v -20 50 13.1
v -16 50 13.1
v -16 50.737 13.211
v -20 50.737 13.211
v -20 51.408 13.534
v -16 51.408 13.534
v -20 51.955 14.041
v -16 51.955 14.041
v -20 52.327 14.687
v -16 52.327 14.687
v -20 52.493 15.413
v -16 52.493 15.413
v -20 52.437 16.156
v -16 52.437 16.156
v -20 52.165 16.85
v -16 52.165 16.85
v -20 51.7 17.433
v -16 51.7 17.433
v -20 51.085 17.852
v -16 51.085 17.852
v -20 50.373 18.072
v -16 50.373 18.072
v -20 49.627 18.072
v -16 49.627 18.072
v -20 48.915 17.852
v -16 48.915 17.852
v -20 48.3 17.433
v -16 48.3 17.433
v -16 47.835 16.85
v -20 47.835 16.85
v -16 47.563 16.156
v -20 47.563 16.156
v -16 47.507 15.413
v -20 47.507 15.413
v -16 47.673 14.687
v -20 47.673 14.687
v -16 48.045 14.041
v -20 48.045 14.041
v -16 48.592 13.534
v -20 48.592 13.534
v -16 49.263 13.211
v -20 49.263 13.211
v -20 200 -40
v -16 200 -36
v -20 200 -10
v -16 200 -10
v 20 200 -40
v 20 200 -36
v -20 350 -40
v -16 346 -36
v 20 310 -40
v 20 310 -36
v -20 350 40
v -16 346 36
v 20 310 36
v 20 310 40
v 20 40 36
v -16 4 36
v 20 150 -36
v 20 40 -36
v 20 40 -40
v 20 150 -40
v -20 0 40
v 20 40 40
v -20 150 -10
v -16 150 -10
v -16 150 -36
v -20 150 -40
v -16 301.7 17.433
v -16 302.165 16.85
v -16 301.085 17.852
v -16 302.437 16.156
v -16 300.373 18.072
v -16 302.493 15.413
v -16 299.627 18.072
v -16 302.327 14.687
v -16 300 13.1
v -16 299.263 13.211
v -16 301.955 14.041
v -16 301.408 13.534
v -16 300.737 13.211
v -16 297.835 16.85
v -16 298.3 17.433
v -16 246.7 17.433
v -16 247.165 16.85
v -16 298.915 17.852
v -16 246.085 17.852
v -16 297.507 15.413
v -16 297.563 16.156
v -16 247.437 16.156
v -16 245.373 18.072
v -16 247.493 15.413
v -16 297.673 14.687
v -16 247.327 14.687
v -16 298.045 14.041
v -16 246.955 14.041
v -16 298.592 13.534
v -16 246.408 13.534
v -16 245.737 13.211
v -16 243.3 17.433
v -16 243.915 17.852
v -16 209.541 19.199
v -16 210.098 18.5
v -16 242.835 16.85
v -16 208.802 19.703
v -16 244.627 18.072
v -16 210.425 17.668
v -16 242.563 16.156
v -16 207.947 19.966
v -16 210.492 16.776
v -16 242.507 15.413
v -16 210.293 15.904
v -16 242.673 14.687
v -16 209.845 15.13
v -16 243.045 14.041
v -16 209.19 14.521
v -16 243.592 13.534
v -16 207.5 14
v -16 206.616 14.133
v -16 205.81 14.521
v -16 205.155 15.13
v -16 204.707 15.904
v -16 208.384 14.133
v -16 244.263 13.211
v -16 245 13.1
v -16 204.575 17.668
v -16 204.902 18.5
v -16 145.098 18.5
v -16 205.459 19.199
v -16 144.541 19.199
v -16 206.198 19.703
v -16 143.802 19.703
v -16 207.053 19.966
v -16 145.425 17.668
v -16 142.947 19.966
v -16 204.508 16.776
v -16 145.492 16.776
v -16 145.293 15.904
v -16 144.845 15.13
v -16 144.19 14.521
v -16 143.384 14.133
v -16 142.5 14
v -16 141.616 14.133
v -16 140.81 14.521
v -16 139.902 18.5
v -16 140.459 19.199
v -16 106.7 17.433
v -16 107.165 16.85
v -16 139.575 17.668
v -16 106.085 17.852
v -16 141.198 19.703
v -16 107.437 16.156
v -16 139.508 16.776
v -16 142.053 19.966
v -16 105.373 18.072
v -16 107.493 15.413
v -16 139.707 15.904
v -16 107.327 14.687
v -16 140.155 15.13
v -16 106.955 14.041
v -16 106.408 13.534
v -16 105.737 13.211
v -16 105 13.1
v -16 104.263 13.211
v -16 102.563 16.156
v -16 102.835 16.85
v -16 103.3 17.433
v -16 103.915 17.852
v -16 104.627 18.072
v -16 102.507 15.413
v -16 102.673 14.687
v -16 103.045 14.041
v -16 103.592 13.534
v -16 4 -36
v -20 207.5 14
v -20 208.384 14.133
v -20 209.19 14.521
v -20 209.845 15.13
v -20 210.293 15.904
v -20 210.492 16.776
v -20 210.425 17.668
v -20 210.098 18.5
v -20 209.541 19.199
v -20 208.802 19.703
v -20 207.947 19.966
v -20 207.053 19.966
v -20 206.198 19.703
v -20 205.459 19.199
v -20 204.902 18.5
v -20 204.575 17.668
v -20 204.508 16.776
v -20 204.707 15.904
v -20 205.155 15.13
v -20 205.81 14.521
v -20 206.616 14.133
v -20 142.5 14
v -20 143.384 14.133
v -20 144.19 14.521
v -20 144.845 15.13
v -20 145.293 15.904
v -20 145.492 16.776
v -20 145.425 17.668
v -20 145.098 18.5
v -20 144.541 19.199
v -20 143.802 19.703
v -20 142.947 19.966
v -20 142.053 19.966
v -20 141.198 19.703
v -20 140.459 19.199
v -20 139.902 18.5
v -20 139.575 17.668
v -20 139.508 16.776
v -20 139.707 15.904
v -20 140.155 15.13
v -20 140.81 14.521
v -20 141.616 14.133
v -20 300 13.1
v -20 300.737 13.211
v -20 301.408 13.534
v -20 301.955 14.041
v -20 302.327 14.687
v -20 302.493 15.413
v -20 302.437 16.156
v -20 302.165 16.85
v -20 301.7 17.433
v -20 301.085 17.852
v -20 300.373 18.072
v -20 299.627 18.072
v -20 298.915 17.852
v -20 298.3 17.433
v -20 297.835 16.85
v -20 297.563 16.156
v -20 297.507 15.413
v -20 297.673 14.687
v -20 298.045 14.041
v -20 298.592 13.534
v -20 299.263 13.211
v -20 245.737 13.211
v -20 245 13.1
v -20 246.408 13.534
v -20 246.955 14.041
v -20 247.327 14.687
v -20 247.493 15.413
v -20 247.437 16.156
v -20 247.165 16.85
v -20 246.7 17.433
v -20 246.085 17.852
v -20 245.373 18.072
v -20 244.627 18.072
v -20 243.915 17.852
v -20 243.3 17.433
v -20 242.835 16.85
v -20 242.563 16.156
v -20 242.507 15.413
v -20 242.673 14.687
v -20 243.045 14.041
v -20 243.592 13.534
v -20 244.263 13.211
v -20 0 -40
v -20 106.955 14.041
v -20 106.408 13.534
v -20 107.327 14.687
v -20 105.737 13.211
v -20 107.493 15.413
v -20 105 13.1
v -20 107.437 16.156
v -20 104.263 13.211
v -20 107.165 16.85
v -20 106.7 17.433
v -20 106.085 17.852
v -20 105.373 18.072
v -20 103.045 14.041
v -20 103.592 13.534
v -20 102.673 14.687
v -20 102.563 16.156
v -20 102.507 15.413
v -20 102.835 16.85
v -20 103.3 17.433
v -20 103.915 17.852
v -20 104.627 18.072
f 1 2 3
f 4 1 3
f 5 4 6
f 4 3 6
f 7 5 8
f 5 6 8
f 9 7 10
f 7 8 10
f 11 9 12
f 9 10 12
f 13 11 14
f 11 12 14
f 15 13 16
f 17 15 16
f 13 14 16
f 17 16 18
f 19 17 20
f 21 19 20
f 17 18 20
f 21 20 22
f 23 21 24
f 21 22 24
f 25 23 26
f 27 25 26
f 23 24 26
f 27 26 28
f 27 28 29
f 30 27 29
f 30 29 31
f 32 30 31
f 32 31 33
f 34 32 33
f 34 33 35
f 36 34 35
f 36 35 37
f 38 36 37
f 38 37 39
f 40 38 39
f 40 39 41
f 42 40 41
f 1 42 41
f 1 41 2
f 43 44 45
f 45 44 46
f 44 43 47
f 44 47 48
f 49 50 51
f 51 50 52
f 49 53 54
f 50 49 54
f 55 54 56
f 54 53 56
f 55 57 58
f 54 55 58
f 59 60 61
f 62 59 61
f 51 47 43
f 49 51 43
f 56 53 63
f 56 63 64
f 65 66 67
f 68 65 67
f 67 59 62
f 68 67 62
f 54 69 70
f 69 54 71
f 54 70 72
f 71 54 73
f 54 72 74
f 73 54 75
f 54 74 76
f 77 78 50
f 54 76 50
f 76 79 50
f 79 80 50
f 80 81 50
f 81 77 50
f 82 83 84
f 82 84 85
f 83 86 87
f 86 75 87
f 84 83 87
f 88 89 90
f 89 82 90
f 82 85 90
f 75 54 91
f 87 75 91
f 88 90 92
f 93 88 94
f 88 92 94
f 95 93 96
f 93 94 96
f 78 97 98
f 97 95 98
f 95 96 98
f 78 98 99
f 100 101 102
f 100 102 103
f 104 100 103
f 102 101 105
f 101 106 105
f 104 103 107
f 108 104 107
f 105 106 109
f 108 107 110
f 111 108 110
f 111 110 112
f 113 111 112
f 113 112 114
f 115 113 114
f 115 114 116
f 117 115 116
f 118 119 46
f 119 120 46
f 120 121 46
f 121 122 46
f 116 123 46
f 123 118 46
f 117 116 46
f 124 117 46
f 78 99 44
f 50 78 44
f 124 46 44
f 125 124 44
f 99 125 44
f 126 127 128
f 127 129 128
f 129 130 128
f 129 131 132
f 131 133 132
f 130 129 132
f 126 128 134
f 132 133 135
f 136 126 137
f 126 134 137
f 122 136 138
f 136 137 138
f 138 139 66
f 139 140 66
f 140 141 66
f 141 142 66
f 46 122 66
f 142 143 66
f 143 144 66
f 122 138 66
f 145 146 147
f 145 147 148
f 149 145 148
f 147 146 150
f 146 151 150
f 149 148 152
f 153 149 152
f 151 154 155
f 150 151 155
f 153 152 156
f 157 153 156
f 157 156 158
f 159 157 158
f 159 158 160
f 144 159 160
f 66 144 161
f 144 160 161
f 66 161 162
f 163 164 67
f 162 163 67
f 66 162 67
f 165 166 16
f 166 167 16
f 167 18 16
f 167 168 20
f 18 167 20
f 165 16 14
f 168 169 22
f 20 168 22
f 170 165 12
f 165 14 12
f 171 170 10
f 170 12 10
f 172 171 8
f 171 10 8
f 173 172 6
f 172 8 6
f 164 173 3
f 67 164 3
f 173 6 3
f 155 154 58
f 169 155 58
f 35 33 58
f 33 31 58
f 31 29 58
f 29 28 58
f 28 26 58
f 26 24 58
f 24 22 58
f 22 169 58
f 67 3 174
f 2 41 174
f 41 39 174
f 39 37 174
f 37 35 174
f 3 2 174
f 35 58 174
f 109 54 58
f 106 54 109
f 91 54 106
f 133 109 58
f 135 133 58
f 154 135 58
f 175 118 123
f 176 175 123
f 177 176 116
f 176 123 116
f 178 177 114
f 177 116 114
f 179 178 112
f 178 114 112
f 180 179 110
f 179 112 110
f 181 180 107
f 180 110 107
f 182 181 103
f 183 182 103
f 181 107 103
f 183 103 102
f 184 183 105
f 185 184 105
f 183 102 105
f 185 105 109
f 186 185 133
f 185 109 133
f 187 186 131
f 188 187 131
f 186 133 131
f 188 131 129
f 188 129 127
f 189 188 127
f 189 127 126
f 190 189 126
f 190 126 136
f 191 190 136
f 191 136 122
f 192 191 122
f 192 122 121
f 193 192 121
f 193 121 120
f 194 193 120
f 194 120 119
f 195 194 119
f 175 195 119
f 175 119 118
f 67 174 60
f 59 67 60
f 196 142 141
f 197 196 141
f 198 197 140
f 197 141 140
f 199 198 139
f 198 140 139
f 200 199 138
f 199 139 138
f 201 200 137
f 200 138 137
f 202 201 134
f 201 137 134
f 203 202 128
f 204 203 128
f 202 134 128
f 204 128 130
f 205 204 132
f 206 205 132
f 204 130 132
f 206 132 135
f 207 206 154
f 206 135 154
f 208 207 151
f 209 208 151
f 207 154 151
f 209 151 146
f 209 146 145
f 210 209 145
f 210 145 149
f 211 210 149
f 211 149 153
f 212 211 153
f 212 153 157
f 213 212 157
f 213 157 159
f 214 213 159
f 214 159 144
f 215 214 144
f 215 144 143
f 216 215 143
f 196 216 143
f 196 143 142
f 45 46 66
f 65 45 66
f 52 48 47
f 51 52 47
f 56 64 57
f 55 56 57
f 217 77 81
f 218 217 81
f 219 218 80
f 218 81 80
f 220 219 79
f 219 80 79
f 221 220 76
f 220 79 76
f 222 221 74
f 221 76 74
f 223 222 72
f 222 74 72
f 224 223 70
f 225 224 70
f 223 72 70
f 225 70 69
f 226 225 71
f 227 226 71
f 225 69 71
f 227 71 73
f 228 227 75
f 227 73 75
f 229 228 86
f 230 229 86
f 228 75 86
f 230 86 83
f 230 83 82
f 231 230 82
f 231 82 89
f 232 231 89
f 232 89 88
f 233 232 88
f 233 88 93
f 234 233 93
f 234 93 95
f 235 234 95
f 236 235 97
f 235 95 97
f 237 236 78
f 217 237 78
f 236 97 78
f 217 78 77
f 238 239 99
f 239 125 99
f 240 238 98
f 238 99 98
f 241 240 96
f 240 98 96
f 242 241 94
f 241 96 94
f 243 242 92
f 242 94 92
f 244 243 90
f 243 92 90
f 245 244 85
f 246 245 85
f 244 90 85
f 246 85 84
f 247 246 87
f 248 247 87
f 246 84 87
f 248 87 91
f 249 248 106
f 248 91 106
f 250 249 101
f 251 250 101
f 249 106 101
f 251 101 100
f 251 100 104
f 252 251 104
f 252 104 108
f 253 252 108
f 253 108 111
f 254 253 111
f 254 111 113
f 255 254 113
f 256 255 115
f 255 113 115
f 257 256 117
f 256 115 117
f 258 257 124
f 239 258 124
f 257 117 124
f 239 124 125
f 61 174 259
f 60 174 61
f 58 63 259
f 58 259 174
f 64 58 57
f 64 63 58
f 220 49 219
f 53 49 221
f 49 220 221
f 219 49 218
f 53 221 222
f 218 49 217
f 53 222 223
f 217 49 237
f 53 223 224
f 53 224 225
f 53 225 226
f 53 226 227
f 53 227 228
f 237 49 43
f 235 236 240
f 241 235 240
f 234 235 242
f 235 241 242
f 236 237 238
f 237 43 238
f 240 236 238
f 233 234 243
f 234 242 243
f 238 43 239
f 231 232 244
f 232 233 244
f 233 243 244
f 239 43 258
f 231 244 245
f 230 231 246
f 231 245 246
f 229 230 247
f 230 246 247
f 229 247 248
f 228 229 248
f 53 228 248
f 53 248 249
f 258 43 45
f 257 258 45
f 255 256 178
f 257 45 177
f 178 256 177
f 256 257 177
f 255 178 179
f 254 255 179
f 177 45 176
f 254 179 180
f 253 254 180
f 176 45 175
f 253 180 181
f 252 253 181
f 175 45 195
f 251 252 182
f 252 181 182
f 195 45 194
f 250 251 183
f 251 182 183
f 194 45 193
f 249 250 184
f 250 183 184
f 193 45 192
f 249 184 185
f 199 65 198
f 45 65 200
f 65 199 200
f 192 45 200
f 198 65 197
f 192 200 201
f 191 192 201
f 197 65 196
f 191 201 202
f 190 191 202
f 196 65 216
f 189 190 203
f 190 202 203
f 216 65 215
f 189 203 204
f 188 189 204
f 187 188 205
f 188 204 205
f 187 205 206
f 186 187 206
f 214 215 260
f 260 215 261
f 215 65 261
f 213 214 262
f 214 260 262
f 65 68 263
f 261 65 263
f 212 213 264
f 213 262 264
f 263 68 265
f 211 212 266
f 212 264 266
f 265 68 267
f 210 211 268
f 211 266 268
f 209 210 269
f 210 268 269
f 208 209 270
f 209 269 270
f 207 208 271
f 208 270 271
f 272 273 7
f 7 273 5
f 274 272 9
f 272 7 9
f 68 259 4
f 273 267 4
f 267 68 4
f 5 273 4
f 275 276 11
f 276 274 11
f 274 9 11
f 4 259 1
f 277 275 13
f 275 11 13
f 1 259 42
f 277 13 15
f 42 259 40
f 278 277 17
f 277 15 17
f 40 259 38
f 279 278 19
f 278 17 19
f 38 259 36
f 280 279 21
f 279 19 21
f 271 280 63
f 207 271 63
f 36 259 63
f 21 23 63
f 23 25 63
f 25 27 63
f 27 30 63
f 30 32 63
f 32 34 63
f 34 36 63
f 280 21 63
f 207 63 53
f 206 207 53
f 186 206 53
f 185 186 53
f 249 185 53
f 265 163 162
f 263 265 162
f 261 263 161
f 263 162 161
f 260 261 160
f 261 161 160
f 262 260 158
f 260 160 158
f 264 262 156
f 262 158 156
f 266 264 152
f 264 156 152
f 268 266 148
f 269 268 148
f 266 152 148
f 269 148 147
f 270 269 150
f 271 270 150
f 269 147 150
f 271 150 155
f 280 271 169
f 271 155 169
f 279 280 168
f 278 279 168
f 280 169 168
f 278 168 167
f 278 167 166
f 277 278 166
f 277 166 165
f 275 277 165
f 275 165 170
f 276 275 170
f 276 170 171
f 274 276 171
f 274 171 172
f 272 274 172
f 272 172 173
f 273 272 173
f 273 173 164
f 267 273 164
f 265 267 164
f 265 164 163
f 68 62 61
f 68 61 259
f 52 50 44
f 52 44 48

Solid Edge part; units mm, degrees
sketch "Sketch1" plane through (0, 0, 0) normal (0, -1, 0) x (1, 0, 0)
  line L0 (20, 36) -> (-16, 36)
  line L1 (-16, 36) -> (-16, -36)
  line L2 (-16, -36) -> (20, -36)
  line L3 (20, -36) -> (20, -40)
  line L4 (20, -40) -> (-20, -40)
  line L5 (-20, -40) -> (-20, 40)
  line L6 (-20, 40) -> (20, 40)
  line L7 (20, 40) -> (20, 36)
  dimension "D1" = 80
  dimension "D2" = 40
  dimension "D3" = 4
  dimension "D4" = 4
extrude "Protrusion1" add sketch "Sketch1" against normal blind 350
sketch "Sketch2" plane through (0, 175, 40) normal (0, 0, 1) x (0, 1, 0)
  line L0 (-175, 20) -> (-135, -20)
extrude "Cutout1" cut sketch "Sketch2" against normal through all material side at (0.0354, 19.9646, 40)
sketch "Sketch3" plane through (0, 175, 40) normal (0, 0, 1) x (0, 1, 0)
  line L0 (175, 20) -> (135, -20)
extrude "Cutout2" cut sketch "Sketch3" against normal through all material side at (0.0354, 330.0354, 40)
hole "Bohrung_1" at (-16, 142.5, 17) direction (-1, 0, 0) diameter 6 end up to next
hole "Hole1" at (-16, 207.5, 17) direction (-1, 0, 0) diameter 6 end up to next
hole "Bohrung_3" at (-16, 50, 15.6) direction (-1, 0, 0) diameter 5 end up to next
hole "Hole2" at (-16, 105, 15.6) direction (-1, 0, 0) diameter 5 end up to next
hole "Hole3" at (-16, 245, 15.6) direction (-1, 0, 0) diameter 5 end up to next
hole "Hole4" at (-16, 300, 15.6) direction (-1, 0, 0) diameter 5 end up to next
sketch "Sketch4" plane through (20, 175, -38) normal (1, 0, 0) x (0, 1, 0)
  line L0 (-25, -2) -> (25, -2)
  line L1 (25, -2) -> (25, 28)
  line L2 (25, 28) -> (-25, 28)
  line L3 (-25, 28) -> (-25, -2)
  dimension "D1" = 50
  dimension "D2" = 30
extrude "Cutout3" cut sketch "Sketch4" against normal through all
properties material "AlMgSi 0,5-1"
